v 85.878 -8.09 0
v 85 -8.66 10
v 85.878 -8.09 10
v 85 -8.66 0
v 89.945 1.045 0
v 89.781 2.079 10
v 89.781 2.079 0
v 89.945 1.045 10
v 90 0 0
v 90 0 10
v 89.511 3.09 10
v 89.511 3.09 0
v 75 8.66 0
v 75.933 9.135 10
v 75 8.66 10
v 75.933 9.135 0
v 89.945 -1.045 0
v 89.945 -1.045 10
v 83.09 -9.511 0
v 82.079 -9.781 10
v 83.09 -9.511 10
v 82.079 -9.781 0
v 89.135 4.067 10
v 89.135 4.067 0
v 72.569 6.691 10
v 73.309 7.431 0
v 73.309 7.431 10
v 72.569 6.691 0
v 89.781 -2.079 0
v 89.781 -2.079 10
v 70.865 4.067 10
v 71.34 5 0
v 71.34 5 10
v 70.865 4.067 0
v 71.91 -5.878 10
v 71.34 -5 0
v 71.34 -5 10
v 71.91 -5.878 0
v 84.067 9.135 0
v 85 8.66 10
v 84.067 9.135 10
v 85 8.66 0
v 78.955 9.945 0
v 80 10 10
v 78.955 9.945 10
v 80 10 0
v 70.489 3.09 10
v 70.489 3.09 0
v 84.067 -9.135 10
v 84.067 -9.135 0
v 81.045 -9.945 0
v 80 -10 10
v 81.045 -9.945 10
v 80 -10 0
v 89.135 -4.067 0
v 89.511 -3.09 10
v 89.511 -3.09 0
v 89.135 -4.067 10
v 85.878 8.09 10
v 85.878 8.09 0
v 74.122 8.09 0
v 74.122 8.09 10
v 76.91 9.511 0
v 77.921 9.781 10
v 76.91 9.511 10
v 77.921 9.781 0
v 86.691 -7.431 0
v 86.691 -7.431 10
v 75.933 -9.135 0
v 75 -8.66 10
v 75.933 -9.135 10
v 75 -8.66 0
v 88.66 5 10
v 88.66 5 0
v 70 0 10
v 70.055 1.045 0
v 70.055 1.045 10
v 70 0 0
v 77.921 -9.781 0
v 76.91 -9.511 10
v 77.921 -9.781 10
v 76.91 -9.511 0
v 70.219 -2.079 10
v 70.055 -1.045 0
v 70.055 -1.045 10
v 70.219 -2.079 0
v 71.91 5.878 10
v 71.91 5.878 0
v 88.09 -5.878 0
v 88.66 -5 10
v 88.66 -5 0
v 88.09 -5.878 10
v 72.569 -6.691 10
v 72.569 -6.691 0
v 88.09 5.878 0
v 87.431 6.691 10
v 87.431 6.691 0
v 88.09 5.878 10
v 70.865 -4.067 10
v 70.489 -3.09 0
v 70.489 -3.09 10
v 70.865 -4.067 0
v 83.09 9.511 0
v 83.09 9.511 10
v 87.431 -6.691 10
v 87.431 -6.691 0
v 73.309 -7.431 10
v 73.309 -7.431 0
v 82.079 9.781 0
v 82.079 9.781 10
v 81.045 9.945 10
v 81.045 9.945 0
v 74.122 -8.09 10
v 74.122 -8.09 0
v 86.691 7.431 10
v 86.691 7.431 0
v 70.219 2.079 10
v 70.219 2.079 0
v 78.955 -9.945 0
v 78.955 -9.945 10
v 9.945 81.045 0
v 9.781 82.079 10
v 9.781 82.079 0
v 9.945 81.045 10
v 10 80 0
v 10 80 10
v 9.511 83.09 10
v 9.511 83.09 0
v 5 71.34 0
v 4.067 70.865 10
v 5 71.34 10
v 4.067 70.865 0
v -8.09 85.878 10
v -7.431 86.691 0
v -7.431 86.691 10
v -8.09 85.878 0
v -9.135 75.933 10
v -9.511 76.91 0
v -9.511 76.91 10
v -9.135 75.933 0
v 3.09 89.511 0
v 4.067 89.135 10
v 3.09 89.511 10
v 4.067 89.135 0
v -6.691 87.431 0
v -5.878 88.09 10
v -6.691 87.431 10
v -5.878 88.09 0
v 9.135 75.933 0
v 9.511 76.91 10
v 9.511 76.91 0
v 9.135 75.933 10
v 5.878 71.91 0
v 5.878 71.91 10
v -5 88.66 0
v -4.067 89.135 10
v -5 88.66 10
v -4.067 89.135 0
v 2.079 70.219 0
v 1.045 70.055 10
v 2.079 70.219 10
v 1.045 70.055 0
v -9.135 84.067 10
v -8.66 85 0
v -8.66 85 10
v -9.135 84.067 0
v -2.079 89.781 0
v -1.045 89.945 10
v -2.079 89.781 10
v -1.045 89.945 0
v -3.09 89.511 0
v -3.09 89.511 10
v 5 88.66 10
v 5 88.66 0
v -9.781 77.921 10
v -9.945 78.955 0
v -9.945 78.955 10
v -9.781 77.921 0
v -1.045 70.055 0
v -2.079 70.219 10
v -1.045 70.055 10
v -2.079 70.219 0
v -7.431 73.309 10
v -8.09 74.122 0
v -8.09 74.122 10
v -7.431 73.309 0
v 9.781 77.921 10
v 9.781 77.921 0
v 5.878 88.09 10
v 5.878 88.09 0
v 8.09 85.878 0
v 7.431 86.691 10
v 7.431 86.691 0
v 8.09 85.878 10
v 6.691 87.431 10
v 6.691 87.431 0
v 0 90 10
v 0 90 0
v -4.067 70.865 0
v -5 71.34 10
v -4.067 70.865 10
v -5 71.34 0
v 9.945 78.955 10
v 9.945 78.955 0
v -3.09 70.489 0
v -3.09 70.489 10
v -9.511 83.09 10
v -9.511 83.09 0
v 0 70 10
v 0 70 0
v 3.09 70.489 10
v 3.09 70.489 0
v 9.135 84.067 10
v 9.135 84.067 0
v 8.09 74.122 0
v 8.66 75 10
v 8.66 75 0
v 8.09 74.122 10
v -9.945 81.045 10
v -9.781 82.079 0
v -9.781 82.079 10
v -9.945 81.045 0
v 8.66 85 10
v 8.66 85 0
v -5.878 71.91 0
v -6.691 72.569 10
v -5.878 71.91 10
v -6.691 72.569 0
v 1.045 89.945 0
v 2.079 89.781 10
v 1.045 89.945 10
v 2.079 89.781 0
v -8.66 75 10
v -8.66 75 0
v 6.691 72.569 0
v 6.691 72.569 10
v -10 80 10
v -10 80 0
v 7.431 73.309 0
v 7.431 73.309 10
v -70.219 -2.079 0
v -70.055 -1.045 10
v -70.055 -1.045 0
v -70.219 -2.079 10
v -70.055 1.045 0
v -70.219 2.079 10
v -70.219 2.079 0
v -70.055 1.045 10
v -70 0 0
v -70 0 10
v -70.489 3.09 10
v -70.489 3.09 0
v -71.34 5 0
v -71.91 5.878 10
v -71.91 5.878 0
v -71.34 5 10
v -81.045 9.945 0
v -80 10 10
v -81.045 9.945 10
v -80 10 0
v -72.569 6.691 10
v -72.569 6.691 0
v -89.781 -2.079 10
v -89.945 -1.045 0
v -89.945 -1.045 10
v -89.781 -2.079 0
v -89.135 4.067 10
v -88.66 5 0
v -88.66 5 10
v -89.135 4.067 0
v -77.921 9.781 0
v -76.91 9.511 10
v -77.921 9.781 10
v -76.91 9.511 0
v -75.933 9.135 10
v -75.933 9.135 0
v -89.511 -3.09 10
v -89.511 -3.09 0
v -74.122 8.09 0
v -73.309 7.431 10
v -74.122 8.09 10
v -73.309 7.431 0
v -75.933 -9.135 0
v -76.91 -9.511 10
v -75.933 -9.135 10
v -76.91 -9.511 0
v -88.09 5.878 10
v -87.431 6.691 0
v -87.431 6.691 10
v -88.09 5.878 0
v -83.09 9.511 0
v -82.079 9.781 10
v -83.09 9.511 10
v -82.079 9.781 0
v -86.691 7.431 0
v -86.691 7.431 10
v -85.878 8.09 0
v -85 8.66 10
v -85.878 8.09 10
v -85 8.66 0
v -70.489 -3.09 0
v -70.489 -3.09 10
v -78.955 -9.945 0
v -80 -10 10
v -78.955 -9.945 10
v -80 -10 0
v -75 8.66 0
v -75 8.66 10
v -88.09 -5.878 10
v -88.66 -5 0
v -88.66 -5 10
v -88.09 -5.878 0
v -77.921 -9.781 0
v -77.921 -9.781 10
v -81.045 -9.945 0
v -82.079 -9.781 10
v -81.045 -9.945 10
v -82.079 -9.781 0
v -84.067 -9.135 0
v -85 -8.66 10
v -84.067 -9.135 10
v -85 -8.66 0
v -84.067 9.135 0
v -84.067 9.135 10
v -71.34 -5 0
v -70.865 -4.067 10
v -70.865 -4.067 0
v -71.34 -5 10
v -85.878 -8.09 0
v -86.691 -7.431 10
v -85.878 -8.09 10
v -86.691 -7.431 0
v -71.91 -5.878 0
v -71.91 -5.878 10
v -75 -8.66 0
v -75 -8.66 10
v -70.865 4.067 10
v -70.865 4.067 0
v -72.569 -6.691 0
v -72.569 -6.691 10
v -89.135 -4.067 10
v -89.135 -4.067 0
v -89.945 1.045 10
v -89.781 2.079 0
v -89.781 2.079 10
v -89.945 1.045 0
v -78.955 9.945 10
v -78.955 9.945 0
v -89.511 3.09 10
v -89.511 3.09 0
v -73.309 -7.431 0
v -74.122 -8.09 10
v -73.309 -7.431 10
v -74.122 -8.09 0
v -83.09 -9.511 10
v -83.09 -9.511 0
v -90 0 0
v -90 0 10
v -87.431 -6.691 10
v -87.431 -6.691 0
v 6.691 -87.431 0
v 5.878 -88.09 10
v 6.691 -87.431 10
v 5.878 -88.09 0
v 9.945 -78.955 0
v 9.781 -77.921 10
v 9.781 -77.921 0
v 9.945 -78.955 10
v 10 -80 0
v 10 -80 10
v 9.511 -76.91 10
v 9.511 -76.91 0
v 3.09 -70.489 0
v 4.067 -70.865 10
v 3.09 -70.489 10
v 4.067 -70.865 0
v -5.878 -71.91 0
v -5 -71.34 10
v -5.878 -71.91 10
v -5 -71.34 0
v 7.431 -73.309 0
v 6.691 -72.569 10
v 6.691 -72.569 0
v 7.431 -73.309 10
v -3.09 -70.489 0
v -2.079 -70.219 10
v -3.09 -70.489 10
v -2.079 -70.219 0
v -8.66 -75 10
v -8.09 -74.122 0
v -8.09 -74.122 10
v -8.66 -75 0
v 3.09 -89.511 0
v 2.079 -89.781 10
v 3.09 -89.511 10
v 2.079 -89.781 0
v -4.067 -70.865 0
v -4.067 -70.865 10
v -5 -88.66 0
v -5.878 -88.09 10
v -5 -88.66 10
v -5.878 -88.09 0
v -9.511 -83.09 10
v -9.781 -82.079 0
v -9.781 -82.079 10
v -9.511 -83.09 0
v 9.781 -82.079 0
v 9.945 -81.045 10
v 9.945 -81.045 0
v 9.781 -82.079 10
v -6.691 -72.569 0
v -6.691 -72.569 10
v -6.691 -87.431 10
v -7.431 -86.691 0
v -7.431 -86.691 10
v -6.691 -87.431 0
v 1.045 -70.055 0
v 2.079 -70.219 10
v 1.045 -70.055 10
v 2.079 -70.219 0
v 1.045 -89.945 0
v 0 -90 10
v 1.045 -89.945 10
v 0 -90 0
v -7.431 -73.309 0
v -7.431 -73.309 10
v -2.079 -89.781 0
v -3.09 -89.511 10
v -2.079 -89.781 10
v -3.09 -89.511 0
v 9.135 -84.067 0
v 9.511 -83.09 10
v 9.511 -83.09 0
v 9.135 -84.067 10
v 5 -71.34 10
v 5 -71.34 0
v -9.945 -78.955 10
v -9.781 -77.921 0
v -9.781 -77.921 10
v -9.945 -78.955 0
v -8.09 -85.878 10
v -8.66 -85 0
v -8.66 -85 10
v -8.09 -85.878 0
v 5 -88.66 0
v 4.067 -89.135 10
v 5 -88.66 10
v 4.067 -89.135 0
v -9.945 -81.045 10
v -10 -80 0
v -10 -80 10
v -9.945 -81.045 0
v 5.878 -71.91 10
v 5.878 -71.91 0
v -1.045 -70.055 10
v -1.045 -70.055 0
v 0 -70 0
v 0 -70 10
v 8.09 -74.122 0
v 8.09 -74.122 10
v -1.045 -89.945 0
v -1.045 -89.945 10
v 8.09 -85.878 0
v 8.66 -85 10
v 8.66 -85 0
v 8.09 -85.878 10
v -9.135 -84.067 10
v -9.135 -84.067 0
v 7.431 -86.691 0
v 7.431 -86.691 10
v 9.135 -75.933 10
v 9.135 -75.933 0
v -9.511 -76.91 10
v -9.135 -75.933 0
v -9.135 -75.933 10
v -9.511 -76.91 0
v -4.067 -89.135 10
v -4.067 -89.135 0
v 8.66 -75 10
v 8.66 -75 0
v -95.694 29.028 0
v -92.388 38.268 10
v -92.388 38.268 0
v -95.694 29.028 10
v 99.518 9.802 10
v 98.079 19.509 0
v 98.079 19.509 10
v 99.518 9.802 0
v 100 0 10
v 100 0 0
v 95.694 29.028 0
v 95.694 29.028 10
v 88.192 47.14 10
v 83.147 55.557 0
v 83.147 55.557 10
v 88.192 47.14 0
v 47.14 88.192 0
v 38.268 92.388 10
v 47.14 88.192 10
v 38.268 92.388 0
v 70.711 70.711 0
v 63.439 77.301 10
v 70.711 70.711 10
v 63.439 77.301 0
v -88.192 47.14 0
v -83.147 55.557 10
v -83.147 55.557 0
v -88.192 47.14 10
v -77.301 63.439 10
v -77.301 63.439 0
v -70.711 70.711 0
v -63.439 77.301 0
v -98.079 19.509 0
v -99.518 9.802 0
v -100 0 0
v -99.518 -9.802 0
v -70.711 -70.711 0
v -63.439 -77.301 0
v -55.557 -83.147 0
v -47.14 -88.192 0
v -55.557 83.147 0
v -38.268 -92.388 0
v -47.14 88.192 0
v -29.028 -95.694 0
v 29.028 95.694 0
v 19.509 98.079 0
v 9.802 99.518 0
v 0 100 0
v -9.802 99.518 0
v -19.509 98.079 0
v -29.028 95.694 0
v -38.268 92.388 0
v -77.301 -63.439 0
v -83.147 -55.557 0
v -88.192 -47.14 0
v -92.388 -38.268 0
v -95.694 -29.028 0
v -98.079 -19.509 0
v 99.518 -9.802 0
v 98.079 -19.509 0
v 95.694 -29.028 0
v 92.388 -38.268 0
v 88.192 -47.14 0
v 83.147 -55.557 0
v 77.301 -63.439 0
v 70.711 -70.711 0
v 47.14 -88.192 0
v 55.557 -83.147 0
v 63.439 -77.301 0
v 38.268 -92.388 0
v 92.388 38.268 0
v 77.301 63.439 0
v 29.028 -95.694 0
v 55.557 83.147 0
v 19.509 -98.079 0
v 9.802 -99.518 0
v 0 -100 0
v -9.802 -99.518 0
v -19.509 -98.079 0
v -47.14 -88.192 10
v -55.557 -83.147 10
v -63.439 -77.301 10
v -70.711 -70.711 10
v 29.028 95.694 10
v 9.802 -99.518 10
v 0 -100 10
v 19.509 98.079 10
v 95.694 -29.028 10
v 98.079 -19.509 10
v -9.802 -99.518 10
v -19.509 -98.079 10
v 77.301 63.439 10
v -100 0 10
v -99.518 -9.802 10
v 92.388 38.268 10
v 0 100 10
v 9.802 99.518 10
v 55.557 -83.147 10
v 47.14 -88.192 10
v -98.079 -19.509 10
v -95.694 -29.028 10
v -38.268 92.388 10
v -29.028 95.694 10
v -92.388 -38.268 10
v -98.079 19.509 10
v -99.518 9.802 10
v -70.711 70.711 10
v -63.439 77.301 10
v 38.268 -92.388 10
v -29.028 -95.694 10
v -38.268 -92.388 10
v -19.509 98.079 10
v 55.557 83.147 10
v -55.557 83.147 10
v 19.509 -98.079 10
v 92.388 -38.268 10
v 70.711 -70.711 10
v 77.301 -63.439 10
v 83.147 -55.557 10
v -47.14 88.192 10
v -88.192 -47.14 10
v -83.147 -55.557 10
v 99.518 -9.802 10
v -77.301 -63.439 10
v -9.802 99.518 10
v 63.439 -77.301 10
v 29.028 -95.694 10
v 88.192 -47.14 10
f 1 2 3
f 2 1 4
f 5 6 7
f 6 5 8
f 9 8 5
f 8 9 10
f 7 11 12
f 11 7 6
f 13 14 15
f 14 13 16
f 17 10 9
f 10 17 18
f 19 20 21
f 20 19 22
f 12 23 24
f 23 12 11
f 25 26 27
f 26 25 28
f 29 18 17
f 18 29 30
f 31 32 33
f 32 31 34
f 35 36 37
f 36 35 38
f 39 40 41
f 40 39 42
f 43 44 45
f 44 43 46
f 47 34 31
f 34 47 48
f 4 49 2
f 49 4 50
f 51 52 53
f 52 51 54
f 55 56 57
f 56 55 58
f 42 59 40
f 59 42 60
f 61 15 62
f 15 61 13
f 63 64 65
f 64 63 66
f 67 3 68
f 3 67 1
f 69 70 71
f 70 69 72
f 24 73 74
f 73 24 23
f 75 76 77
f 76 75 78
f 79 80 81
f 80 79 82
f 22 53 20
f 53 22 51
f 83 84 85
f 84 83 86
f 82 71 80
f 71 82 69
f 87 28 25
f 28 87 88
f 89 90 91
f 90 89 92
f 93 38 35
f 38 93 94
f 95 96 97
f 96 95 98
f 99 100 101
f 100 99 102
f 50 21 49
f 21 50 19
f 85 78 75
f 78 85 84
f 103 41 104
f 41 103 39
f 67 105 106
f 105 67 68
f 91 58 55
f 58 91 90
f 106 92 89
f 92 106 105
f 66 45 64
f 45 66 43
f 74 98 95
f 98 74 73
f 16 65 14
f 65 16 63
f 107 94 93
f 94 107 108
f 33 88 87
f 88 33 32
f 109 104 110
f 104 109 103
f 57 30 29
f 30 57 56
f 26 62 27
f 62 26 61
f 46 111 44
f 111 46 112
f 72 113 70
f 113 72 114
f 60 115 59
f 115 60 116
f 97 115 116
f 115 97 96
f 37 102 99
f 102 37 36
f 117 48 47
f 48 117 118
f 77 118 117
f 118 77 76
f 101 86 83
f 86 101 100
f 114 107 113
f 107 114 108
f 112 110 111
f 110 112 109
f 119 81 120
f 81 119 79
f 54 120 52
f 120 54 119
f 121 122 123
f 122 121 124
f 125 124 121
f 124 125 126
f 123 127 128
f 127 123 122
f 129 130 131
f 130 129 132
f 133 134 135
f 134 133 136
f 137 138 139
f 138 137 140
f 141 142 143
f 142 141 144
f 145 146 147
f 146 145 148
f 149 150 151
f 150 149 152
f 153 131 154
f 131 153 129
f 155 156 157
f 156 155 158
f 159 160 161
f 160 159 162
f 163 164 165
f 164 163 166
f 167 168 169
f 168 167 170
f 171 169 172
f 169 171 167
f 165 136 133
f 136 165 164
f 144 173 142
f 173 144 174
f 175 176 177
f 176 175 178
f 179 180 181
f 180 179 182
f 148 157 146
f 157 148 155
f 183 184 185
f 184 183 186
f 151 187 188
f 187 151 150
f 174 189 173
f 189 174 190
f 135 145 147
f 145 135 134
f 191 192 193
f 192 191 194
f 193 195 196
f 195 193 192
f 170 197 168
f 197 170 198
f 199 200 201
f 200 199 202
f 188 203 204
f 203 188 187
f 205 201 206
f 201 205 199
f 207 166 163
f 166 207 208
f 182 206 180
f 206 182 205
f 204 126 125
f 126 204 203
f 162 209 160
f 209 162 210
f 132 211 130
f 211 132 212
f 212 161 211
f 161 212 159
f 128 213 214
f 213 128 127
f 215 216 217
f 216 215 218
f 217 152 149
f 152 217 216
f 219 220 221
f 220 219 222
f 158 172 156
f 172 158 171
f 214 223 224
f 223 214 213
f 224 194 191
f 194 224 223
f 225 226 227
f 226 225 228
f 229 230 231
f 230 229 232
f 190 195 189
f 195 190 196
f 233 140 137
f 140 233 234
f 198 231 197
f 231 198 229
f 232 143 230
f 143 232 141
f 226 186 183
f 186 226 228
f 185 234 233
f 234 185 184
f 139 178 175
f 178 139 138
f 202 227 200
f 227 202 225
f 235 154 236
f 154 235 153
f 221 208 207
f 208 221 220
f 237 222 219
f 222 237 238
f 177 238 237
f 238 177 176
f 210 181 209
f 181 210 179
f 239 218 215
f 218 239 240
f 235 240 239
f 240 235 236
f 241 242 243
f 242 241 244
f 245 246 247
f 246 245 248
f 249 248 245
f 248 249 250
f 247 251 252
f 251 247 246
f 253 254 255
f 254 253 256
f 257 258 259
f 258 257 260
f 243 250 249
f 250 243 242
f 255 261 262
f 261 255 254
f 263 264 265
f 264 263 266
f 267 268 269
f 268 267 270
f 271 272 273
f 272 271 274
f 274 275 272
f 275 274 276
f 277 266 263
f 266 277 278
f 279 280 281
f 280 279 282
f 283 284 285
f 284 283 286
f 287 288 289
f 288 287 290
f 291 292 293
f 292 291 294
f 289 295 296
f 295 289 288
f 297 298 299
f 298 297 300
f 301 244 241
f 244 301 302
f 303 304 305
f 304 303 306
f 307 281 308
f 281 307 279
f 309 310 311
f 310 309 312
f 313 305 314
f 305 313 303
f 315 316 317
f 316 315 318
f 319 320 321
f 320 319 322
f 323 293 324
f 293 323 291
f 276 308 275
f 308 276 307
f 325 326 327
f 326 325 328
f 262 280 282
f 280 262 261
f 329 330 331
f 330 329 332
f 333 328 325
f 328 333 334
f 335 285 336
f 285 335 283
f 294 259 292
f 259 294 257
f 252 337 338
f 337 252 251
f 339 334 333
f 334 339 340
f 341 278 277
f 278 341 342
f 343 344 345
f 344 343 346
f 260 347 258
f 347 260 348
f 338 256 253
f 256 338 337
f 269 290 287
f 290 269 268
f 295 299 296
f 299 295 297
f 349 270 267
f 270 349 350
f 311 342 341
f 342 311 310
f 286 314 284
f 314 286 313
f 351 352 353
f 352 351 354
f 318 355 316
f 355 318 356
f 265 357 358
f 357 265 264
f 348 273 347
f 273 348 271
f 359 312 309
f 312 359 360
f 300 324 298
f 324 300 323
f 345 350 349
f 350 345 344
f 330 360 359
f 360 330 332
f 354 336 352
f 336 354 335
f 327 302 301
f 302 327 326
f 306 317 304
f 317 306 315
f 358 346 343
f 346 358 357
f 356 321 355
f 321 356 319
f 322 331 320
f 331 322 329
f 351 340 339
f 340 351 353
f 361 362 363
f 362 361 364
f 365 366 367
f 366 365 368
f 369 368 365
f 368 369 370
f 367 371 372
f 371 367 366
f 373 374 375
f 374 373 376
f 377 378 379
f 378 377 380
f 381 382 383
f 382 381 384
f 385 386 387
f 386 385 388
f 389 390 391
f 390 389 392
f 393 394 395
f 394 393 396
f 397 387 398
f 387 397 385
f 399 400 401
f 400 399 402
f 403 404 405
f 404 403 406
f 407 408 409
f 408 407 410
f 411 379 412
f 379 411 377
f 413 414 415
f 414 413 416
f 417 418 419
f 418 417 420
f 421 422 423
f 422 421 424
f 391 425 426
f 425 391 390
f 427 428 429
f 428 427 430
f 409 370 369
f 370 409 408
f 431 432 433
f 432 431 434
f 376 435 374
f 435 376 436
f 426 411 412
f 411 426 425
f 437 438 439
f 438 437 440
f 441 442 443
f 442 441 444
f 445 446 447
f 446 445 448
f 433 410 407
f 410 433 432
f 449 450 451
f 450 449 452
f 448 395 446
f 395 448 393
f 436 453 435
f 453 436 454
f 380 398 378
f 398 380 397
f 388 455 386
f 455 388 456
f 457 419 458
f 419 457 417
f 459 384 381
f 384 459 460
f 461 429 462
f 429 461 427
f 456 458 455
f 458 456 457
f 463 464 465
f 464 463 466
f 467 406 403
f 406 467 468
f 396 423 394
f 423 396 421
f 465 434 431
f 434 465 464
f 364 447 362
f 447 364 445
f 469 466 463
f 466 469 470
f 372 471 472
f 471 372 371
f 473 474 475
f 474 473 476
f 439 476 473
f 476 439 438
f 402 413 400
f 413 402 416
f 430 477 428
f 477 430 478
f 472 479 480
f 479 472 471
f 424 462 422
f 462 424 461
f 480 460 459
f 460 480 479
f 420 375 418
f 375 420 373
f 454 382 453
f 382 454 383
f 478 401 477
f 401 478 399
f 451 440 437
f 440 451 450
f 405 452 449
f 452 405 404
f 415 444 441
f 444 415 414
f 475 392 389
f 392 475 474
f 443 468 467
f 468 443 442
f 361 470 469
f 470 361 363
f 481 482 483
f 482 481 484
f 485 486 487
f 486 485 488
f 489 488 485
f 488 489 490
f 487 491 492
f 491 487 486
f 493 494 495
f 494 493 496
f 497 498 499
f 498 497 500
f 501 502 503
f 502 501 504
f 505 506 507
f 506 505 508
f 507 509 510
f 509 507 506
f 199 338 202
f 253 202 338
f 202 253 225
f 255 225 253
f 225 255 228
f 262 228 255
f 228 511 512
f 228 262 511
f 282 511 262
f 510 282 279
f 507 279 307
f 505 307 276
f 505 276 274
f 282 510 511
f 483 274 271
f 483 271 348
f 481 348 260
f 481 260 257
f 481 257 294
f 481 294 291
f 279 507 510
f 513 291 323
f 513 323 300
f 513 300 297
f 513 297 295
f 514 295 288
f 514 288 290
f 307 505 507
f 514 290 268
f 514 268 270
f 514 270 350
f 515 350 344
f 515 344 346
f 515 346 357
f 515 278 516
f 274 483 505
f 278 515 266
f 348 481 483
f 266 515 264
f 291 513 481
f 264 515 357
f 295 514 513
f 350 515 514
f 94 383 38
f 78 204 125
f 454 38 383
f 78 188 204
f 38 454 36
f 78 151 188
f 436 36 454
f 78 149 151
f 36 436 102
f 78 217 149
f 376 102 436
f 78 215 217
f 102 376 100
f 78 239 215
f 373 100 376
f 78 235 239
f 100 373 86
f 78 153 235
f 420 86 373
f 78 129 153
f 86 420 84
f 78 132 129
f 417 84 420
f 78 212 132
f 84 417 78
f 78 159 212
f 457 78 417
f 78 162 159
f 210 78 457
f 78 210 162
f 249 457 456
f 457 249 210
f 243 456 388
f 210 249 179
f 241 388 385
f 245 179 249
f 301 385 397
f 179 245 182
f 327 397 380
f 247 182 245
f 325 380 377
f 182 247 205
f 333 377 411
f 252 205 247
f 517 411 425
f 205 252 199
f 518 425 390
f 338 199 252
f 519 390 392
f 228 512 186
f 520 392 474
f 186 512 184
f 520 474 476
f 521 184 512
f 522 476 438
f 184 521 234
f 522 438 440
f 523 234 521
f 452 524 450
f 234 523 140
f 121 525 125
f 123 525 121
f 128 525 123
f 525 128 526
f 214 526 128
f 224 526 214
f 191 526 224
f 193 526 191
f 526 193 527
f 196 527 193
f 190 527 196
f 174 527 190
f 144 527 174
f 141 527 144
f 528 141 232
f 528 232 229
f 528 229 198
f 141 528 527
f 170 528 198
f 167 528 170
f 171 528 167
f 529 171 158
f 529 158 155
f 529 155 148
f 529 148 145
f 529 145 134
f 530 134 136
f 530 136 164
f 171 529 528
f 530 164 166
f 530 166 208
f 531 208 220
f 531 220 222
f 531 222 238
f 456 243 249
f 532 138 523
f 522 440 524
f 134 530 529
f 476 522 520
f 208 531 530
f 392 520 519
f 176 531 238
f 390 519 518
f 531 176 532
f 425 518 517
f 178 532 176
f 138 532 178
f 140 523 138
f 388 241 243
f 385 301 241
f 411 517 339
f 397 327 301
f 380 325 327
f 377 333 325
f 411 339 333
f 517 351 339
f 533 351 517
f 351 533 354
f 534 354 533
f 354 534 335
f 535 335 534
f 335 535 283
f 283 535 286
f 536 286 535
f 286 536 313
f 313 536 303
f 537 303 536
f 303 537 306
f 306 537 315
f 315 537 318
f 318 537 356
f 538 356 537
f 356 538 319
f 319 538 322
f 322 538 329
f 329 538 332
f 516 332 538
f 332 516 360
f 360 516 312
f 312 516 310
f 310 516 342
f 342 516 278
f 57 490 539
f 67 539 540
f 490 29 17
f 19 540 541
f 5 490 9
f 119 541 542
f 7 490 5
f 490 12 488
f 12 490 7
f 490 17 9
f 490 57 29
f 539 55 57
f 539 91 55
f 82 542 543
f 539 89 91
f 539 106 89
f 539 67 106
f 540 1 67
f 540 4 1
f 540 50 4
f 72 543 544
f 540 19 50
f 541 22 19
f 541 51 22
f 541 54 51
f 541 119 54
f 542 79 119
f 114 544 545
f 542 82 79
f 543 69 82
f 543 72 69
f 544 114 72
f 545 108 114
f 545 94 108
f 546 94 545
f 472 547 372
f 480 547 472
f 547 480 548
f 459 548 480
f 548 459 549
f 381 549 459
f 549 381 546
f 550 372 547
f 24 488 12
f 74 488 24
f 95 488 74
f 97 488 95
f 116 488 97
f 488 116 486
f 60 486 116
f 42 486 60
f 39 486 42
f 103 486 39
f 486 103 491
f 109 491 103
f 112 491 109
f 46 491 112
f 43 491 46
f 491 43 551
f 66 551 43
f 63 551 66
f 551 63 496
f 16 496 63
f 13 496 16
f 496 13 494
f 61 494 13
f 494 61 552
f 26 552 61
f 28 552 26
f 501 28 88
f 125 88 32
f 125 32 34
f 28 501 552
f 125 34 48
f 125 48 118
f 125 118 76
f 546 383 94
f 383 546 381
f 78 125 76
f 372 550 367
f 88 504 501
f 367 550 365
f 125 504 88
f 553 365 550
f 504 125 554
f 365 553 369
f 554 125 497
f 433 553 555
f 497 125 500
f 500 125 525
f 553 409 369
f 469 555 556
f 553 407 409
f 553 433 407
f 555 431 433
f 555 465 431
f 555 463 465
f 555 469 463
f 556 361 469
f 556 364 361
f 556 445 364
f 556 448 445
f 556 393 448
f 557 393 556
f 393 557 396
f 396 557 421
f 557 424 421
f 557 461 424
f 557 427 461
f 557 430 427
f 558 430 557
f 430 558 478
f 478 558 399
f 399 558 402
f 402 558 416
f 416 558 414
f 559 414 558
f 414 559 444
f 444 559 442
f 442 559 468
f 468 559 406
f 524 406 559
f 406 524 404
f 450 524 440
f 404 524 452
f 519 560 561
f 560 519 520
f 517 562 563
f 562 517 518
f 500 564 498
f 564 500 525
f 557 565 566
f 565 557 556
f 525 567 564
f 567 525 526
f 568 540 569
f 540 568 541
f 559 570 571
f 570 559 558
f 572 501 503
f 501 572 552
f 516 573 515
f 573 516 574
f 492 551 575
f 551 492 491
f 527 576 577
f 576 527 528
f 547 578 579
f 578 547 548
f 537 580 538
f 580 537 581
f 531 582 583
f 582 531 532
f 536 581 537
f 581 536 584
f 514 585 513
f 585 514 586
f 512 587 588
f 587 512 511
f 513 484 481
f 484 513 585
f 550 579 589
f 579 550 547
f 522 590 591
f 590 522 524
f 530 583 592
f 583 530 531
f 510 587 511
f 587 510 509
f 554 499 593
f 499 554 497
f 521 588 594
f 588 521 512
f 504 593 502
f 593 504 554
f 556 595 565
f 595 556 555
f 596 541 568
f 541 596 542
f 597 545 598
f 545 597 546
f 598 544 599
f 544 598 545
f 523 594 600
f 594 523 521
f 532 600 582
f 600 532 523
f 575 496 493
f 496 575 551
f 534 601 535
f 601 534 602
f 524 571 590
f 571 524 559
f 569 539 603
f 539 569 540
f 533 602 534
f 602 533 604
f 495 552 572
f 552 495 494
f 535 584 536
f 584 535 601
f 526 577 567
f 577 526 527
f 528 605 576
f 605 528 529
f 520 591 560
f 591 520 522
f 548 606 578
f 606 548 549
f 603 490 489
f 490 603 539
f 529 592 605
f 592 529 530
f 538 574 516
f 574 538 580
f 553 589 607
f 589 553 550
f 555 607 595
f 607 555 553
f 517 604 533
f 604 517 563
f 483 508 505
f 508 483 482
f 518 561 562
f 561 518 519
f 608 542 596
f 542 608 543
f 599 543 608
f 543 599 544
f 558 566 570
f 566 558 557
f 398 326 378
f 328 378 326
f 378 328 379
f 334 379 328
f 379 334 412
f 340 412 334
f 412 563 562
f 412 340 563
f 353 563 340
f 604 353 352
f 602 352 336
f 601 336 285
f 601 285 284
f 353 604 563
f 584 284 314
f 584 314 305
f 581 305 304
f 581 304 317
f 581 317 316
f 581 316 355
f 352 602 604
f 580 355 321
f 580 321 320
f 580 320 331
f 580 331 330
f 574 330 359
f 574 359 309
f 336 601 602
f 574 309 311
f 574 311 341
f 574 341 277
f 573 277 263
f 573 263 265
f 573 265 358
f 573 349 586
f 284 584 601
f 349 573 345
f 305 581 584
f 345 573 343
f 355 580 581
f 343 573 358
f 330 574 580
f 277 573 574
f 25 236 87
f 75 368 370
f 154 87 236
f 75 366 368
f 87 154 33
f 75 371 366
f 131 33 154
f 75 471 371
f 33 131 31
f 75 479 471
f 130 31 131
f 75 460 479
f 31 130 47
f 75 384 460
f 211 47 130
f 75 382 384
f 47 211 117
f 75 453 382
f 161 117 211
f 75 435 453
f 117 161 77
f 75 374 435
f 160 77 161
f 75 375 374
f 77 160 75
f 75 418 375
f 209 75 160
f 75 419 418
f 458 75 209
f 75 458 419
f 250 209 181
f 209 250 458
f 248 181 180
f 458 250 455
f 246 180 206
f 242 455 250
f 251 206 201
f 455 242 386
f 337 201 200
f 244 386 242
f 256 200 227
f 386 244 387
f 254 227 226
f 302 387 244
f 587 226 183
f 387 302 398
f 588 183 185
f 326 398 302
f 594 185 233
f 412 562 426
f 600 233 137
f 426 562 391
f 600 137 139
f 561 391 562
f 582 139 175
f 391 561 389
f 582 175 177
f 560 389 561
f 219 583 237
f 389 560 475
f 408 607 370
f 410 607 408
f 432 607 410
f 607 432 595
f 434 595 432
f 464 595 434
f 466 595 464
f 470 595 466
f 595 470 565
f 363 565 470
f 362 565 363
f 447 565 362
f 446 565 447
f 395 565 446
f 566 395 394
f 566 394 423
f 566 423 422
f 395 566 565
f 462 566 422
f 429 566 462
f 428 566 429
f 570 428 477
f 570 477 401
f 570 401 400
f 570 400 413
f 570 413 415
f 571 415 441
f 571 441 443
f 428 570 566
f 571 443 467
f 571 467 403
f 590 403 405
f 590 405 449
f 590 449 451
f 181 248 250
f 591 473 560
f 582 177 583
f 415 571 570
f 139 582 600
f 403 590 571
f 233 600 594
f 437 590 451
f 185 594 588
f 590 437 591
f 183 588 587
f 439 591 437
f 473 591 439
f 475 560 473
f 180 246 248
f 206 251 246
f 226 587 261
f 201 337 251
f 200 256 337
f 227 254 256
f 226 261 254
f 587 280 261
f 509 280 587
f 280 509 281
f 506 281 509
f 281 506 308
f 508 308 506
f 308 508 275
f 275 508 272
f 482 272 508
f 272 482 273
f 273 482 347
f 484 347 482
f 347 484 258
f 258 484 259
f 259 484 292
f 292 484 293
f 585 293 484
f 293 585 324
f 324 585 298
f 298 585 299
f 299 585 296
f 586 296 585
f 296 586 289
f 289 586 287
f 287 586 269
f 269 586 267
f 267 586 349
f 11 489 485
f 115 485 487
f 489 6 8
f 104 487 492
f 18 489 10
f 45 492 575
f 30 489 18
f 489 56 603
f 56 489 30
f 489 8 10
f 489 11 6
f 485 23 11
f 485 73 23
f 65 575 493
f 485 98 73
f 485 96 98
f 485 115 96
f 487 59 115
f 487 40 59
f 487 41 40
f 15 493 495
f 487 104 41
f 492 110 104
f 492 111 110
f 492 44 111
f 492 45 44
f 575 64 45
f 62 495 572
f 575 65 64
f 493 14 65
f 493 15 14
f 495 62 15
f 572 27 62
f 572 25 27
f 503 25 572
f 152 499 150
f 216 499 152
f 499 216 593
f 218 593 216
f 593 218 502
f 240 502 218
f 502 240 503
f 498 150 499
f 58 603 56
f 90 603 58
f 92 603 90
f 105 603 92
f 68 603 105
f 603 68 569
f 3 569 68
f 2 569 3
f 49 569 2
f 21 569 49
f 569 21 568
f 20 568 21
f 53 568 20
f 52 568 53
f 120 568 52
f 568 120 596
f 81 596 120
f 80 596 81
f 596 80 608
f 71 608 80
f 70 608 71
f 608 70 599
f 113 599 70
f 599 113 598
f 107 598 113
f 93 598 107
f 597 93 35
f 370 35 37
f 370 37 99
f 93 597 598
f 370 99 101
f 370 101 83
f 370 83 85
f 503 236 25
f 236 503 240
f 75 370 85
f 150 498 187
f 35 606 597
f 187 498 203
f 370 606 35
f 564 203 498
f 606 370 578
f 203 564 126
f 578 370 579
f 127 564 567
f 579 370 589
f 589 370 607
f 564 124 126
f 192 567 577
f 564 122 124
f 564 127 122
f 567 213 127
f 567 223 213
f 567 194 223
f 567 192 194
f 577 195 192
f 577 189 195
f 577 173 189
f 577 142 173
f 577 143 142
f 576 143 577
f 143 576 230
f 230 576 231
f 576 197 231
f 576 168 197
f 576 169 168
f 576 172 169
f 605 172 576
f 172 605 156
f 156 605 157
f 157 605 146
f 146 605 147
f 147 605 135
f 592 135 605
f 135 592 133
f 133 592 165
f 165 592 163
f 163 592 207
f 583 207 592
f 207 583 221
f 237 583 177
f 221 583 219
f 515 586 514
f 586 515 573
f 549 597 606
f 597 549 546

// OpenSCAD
module Flange_Blind(){
color("#c0c6c7")
difference(){
cylinder(10,100,100, $fn = $preview ? 32 : 64);

r = 80;
for (i=[0:90:359]) {
    translate([r*cos(i),r*sin(i),-1])
        cylinder(12,10,10,$fn=60);
}

}

}

Flange_Blind();
